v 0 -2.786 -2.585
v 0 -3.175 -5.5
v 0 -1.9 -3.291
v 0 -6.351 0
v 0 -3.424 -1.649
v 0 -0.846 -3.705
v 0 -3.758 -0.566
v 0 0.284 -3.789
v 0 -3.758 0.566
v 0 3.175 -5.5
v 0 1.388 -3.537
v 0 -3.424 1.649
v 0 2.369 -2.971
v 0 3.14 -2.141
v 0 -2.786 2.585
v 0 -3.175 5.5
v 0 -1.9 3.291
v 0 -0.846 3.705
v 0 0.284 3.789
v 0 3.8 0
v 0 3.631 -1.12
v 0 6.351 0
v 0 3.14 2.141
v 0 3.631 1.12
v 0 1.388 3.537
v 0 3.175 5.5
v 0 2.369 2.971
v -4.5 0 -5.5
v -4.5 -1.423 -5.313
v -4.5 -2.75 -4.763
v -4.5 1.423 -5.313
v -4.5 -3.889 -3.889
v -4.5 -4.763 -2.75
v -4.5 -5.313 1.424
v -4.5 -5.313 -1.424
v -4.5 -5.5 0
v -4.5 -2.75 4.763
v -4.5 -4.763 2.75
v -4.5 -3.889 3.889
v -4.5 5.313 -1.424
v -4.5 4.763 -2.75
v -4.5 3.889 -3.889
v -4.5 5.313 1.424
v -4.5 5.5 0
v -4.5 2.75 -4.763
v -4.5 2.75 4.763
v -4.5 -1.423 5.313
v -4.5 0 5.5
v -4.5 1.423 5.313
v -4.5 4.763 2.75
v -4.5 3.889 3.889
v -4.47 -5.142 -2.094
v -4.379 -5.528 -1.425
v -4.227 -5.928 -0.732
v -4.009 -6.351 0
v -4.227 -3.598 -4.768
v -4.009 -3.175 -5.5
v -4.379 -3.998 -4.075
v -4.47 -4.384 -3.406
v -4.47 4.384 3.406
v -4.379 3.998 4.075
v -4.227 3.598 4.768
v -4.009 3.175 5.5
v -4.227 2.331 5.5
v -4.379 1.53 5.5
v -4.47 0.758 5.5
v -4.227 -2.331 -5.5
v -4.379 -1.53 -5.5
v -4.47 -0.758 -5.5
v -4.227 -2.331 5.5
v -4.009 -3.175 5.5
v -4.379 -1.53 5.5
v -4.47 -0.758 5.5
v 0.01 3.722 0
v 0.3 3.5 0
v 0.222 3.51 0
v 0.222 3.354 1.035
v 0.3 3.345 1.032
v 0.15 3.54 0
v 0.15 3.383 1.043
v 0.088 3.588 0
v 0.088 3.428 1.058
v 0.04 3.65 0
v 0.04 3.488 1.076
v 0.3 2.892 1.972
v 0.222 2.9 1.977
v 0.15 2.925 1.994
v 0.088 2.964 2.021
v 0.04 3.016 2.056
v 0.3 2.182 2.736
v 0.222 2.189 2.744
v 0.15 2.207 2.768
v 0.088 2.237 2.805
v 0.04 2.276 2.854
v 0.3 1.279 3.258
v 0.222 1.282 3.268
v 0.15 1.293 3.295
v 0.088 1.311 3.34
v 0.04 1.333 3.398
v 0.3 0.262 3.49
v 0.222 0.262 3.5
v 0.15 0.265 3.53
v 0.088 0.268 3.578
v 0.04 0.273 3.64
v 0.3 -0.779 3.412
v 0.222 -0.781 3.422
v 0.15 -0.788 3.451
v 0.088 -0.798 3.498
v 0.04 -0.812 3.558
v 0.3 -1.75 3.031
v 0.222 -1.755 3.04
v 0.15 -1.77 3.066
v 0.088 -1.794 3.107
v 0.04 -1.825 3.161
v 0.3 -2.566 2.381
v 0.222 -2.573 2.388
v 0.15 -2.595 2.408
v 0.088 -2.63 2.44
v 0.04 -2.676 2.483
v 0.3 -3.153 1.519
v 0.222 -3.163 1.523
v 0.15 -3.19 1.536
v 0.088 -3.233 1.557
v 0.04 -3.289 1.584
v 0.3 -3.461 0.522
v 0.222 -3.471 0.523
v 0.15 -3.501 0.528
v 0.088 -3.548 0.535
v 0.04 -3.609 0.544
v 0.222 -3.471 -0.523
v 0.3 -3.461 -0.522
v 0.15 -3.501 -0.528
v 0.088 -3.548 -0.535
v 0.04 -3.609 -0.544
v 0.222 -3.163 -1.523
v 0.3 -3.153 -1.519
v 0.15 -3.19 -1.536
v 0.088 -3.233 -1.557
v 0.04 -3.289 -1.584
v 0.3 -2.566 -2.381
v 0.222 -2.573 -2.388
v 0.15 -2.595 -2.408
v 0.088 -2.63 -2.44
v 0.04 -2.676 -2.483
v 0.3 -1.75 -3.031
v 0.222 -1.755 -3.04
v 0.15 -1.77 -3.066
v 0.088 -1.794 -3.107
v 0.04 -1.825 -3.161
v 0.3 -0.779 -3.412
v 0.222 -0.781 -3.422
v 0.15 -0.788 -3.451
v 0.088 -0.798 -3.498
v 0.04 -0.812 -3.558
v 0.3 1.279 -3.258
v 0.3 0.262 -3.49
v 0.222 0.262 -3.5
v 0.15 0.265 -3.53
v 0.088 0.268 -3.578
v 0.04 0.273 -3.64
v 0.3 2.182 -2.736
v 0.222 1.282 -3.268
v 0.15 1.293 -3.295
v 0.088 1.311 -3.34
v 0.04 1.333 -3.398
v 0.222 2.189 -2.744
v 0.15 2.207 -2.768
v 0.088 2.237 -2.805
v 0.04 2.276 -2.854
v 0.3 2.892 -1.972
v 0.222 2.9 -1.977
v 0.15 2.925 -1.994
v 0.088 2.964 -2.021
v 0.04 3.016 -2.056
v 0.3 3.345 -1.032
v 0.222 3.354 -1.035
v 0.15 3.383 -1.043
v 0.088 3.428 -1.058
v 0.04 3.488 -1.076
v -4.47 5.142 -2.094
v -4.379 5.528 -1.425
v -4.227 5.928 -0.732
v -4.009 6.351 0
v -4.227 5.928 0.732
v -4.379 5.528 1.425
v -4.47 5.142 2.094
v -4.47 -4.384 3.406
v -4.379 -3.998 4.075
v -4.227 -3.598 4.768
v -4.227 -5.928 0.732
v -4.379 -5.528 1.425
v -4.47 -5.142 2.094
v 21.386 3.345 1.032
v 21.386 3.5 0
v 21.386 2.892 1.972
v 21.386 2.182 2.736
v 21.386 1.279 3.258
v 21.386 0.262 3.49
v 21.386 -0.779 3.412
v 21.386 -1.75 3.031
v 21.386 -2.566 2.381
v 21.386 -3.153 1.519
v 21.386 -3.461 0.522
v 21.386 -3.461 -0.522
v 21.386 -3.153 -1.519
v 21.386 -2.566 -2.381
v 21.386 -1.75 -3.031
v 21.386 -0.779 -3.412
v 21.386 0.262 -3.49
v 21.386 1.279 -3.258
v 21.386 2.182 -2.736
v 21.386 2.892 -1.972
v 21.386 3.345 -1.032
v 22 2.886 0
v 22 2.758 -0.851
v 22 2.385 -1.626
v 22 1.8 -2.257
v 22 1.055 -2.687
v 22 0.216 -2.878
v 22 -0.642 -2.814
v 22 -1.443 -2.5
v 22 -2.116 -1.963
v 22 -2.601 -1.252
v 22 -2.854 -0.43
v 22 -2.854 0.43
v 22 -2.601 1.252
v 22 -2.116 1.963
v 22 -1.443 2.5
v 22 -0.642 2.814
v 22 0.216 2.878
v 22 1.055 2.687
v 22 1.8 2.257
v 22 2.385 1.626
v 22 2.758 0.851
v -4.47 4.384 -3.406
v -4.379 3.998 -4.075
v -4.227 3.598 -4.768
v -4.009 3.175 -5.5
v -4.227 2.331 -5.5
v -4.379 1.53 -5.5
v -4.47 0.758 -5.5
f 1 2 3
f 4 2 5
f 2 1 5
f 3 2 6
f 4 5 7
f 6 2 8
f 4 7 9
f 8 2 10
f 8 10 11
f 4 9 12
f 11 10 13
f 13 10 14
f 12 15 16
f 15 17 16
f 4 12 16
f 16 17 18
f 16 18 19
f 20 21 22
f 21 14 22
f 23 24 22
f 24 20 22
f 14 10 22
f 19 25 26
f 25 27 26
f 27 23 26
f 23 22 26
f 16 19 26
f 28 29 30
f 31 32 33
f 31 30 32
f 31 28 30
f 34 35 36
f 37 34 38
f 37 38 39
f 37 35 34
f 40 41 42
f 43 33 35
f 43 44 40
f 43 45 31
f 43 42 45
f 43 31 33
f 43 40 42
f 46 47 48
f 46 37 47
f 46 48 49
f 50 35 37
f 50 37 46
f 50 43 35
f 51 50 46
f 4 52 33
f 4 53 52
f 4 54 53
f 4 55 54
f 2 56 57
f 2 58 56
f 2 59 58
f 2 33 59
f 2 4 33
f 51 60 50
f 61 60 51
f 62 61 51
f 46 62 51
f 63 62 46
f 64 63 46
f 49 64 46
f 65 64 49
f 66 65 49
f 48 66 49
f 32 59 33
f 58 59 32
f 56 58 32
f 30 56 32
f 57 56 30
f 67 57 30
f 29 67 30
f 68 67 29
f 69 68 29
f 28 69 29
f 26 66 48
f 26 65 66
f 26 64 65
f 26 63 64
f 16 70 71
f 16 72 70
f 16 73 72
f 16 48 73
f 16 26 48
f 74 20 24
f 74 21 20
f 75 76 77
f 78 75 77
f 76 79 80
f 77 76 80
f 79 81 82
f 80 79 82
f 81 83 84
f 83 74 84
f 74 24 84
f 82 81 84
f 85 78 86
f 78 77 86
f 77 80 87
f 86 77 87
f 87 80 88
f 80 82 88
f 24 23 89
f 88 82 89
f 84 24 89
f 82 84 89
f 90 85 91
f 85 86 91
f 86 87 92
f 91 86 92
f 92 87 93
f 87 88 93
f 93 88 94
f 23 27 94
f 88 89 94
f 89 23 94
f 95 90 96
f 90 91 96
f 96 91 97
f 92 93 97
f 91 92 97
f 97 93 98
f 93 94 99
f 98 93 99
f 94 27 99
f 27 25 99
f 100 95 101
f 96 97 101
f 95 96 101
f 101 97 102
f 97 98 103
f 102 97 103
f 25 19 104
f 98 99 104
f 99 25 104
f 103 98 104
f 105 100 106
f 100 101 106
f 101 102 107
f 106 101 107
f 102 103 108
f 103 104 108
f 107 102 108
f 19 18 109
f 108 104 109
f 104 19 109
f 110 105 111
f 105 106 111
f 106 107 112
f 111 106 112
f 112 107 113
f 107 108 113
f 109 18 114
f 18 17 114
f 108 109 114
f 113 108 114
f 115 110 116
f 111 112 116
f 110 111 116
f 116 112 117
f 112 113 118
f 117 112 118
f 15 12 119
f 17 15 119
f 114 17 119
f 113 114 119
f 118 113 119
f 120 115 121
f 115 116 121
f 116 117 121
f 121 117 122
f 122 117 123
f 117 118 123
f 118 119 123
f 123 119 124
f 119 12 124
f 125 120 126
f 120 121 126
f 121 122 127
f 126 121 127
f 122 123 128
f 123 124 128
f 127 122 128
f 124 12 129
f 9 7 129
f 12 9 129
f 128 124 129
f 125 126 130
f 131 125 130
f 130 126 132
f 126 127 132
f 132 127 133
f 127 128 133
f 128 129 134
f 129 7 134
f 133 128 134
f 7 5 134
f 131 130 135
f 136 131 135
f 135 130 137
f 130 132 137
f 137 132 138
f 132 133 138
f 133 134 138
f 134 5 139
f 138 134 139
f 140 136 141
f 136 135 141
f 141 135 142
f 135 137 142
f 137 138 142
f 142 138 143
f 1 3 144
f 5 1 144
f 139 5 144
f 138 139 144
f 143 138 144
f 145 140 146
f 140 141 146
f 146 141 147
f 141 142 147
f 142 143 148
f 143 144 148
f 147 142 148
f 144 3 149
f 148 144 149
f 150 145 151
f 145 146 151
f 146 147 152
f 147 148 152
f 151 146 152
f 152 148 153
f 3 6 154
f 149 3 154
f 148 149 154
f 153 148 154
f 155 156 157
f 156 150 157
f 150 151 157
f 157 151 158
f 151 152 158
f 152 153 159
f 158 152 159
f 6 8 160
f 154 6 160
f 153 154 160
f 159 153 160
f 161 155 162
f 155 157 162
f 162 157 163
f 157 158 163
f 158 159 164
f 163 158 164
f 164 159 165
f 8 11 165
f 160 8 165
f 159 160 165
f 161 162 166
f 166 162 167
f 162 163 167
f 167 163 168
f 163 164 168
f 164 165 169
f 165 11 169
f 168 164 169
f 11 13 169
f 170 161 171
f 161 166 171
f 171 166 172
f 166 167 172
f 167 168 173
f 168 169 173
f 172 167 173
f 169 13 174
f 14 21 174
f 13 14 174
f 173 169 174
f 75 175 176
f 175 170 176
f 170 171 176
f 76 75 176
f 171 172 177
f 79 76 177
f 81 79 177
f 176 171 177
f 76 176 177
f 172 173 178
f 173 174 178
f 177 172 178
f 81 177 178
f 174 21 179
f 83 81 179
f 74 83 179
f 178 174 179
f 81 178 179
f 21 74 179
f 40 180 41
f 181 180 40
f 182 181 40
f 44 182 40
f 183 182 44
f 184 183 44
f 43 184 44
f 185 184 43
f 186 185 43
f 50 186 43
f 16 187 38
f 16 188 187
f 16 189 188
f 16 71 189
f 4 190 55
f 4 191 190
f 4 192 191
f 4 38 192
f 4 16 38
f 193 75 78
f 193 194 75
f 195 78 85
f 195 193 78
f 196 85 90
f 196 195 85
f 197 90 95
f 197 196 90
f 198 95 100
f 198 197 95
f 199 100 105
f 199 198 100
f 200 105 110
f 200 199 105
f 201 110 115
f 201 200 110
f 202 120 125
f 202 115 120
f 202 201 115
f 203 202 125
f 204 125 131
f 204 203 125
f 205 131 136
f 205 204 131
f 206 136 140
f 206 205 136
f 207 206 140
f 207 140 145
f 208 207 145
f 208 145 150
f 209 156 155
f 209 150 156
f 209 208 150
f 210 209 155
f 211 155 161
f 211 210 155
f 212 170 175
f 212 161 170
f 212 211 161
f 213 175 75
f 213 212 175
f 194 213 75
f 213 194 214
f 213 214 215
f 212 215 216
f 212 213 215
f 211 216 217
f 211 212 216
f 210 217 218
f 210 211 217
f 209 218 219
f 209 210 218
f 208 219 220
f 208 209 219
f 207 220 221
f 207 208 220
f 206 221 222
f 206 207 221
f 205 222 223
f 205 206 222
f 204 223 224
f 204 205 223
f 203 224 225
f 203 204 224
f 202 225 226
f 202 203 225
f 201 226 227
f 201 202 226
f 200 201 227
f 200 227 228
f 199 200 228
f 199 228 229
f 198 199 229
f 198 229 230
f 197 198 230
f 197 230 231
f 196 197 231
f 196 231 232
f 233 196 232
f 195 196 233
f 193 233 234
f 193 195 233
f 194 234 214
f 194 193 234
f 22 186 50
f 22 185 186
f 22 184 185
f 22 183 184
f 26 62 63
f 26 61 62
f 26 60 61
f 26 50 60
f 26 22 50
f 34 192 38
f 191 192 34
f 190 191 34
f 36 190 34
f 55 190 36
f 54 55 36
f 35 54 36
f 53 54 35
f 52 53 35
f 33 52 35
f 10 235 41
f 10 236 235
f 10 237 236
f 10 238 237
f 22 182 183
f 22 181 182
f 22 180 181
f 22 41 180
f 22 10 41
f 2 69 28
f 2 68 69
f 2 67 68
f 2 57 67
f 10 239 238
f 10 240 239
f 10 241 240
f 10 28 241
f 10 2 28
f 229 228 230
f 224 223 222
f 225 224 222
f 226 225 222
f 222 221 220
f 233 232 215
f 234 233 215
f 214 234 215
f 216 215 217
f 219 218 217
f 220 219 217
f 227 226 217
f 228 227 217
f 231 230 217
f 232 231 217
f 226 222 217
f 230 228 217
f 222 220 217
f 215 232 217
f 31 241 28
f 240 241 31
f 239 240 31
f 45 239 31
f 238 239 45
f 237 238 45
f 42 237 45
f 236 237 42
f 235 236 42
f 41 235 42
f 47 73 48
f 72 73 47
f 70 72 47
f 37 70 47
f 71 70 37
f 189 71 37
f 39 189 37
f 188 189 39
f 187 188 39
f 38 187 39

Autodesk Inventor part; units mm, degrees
ref_plane "YZ Plane" through (0, 0, 0) normal (1, 0, 0) x (0, 1, 0)
ref_plane "XZ Plane" through (0, 0, 0) normal (0, 1, 0) x (-1, 0, 0)
sketch "Sketch1" plane through (0, 0, 0) normal (0, 0, 1) x (1, 0, 0)
  line L0 (0, 3.5) -> (22, 3.5)
  line L1 (22, 3.5) -> (22, 0)
  line L2 (22, 0) -> (0, 0)
  line L3 (-4.4, 0) -> (26.4, 0) projected
  line L4 (0, -0.7) -> (0, 4.2) projected
  line L5 (0, 3.5) -> (0, 0)
  dimension "d2" = 7
  dimension "d59" = 22
revolve "Body" add sketch "Sketch1" angle 360 about axis through (22, 0, 0) along (-1, 0, 0)
sketch "Sketch2" plane through (0, 0, 0) normal (-1, 0, 0) x (0, 0, 1)
  line L0 (0, 6.3509) -> (5.5, 3.1754)
  line L1 (5.5, 3.1754) -> (5.5, -3.1754)
  line L2 (5.5, -3.1754) -> (0, -6.3509)
  line L3 (0, -6.3509) -> (-5.5, -3.1754)
  line L4 (-5.5, -3.1754) -> (-5.5, 3.1754)
  line L5 (-5.5, 3.1754) -> (0, 6.3509)
  line L6 (-7.7, 0) -> (7.7, 0) projected
  line L7 (0, 8.8912) -> (0, -8.8912) projected
  point P0 (0, 0)
  point P1 (0, 0)
  dimension "d11" = 11
extrude "Head" add sketch "Sketch2" along normal blind 4.5
sketch "Sketch4" plane through (0, 0, 0) normal (0, 0, 1) x (1, 0, 0)
  line L0 (-3.8649, 6.6) -> (-4.5, 5.5)
  line L1 (-1.1, 0) -> (-0.234, 0)
  line L2 (-5.3532, 0) -> (0.6192, 0) projected
  line L3 (-4.5, 6.6) -> (-3.8649, 6.6)
  line L4 (-4.5, 5.5) -> (-4.5, 6.6)
  line L5 (0, 7.92) -> (0, -1.32) projected
  dimension "d65" = 11
  dimension "d67" = 30
  dimension "d68" = 13.2
  dimension "d69" = 4.5
revolve "Chamfer1" cut sketch "Sketch4" angle 360 about axis through (-1.1, 0, 0) along (1, 0, 0)
thread "Thread" size "M7x1" class "6g" standard "ISO Metric profile" length 13
chamfer "Chamfer2" distance 0.6135 distance2 0.6136 1 edges at (22, -3.5, 0) measured on face at (22, 0.6242, -1.2774)
fillet "Fillet2" radius 0.3 1 edges at (0, -3.5, 0)
ref_plane "Work Plane1" through (1.525, 0, 0) normal (0, 0, 1) x (1, 0, 0)
equation "\"d2\" = GD"
equation "\"d59\" = NLG"
equation "\"d11\" = SW"
equation "\"d3\" = KOH"
equation "\"d71\" = RR"
equation "\"d15\" = GEL"
equation "\"d6\" = -0.5 * SPD + 0.5 * GD"
equation "\"d65\" = SW"
equation "\"d67\" = ANG1"
equation "\"d68\" = 1.2 * SW"
equation "\"d69\" = KOH"
equation "\"NLG\" = 22"
equation "\"GD\" = NND"
equation "\"BDM\" = NND"
equation "\"KOH\" = 4.5"
equation "\"GEL\" = 13"
equation "\"SW\" = 11"
equation "\"SW0\" = 11"
equation "\"SPD\" = NND - 1.2269 * PTC"
equation "\"SD2\" = NND"
equation "\"SD\" = 0"
equation "\"ANG1\" = 30deg"
equation "\"GAL\" = 0.61345 * PTC"
equation "\"GUL\" = 0.61345 * PTC"
equation "\"RR\" = 0.3"
equation "\"RR1\" = 0.1"
equation "\"GD1\" = THREADDIA - 1.2269 * PTC"
equation "\"THREADDIA\" = 7"
equation "\"TOA\" = 30deg"
equation "\"FAWI\" = 60deg"
equation "\"PTC\" = 1"
equation "\"NND\" = 7"
equation "\"E0\" = 1.155 * SW"
properties part number "CSN 02 1201 - M7 x 22" material "Steel, Mild"
